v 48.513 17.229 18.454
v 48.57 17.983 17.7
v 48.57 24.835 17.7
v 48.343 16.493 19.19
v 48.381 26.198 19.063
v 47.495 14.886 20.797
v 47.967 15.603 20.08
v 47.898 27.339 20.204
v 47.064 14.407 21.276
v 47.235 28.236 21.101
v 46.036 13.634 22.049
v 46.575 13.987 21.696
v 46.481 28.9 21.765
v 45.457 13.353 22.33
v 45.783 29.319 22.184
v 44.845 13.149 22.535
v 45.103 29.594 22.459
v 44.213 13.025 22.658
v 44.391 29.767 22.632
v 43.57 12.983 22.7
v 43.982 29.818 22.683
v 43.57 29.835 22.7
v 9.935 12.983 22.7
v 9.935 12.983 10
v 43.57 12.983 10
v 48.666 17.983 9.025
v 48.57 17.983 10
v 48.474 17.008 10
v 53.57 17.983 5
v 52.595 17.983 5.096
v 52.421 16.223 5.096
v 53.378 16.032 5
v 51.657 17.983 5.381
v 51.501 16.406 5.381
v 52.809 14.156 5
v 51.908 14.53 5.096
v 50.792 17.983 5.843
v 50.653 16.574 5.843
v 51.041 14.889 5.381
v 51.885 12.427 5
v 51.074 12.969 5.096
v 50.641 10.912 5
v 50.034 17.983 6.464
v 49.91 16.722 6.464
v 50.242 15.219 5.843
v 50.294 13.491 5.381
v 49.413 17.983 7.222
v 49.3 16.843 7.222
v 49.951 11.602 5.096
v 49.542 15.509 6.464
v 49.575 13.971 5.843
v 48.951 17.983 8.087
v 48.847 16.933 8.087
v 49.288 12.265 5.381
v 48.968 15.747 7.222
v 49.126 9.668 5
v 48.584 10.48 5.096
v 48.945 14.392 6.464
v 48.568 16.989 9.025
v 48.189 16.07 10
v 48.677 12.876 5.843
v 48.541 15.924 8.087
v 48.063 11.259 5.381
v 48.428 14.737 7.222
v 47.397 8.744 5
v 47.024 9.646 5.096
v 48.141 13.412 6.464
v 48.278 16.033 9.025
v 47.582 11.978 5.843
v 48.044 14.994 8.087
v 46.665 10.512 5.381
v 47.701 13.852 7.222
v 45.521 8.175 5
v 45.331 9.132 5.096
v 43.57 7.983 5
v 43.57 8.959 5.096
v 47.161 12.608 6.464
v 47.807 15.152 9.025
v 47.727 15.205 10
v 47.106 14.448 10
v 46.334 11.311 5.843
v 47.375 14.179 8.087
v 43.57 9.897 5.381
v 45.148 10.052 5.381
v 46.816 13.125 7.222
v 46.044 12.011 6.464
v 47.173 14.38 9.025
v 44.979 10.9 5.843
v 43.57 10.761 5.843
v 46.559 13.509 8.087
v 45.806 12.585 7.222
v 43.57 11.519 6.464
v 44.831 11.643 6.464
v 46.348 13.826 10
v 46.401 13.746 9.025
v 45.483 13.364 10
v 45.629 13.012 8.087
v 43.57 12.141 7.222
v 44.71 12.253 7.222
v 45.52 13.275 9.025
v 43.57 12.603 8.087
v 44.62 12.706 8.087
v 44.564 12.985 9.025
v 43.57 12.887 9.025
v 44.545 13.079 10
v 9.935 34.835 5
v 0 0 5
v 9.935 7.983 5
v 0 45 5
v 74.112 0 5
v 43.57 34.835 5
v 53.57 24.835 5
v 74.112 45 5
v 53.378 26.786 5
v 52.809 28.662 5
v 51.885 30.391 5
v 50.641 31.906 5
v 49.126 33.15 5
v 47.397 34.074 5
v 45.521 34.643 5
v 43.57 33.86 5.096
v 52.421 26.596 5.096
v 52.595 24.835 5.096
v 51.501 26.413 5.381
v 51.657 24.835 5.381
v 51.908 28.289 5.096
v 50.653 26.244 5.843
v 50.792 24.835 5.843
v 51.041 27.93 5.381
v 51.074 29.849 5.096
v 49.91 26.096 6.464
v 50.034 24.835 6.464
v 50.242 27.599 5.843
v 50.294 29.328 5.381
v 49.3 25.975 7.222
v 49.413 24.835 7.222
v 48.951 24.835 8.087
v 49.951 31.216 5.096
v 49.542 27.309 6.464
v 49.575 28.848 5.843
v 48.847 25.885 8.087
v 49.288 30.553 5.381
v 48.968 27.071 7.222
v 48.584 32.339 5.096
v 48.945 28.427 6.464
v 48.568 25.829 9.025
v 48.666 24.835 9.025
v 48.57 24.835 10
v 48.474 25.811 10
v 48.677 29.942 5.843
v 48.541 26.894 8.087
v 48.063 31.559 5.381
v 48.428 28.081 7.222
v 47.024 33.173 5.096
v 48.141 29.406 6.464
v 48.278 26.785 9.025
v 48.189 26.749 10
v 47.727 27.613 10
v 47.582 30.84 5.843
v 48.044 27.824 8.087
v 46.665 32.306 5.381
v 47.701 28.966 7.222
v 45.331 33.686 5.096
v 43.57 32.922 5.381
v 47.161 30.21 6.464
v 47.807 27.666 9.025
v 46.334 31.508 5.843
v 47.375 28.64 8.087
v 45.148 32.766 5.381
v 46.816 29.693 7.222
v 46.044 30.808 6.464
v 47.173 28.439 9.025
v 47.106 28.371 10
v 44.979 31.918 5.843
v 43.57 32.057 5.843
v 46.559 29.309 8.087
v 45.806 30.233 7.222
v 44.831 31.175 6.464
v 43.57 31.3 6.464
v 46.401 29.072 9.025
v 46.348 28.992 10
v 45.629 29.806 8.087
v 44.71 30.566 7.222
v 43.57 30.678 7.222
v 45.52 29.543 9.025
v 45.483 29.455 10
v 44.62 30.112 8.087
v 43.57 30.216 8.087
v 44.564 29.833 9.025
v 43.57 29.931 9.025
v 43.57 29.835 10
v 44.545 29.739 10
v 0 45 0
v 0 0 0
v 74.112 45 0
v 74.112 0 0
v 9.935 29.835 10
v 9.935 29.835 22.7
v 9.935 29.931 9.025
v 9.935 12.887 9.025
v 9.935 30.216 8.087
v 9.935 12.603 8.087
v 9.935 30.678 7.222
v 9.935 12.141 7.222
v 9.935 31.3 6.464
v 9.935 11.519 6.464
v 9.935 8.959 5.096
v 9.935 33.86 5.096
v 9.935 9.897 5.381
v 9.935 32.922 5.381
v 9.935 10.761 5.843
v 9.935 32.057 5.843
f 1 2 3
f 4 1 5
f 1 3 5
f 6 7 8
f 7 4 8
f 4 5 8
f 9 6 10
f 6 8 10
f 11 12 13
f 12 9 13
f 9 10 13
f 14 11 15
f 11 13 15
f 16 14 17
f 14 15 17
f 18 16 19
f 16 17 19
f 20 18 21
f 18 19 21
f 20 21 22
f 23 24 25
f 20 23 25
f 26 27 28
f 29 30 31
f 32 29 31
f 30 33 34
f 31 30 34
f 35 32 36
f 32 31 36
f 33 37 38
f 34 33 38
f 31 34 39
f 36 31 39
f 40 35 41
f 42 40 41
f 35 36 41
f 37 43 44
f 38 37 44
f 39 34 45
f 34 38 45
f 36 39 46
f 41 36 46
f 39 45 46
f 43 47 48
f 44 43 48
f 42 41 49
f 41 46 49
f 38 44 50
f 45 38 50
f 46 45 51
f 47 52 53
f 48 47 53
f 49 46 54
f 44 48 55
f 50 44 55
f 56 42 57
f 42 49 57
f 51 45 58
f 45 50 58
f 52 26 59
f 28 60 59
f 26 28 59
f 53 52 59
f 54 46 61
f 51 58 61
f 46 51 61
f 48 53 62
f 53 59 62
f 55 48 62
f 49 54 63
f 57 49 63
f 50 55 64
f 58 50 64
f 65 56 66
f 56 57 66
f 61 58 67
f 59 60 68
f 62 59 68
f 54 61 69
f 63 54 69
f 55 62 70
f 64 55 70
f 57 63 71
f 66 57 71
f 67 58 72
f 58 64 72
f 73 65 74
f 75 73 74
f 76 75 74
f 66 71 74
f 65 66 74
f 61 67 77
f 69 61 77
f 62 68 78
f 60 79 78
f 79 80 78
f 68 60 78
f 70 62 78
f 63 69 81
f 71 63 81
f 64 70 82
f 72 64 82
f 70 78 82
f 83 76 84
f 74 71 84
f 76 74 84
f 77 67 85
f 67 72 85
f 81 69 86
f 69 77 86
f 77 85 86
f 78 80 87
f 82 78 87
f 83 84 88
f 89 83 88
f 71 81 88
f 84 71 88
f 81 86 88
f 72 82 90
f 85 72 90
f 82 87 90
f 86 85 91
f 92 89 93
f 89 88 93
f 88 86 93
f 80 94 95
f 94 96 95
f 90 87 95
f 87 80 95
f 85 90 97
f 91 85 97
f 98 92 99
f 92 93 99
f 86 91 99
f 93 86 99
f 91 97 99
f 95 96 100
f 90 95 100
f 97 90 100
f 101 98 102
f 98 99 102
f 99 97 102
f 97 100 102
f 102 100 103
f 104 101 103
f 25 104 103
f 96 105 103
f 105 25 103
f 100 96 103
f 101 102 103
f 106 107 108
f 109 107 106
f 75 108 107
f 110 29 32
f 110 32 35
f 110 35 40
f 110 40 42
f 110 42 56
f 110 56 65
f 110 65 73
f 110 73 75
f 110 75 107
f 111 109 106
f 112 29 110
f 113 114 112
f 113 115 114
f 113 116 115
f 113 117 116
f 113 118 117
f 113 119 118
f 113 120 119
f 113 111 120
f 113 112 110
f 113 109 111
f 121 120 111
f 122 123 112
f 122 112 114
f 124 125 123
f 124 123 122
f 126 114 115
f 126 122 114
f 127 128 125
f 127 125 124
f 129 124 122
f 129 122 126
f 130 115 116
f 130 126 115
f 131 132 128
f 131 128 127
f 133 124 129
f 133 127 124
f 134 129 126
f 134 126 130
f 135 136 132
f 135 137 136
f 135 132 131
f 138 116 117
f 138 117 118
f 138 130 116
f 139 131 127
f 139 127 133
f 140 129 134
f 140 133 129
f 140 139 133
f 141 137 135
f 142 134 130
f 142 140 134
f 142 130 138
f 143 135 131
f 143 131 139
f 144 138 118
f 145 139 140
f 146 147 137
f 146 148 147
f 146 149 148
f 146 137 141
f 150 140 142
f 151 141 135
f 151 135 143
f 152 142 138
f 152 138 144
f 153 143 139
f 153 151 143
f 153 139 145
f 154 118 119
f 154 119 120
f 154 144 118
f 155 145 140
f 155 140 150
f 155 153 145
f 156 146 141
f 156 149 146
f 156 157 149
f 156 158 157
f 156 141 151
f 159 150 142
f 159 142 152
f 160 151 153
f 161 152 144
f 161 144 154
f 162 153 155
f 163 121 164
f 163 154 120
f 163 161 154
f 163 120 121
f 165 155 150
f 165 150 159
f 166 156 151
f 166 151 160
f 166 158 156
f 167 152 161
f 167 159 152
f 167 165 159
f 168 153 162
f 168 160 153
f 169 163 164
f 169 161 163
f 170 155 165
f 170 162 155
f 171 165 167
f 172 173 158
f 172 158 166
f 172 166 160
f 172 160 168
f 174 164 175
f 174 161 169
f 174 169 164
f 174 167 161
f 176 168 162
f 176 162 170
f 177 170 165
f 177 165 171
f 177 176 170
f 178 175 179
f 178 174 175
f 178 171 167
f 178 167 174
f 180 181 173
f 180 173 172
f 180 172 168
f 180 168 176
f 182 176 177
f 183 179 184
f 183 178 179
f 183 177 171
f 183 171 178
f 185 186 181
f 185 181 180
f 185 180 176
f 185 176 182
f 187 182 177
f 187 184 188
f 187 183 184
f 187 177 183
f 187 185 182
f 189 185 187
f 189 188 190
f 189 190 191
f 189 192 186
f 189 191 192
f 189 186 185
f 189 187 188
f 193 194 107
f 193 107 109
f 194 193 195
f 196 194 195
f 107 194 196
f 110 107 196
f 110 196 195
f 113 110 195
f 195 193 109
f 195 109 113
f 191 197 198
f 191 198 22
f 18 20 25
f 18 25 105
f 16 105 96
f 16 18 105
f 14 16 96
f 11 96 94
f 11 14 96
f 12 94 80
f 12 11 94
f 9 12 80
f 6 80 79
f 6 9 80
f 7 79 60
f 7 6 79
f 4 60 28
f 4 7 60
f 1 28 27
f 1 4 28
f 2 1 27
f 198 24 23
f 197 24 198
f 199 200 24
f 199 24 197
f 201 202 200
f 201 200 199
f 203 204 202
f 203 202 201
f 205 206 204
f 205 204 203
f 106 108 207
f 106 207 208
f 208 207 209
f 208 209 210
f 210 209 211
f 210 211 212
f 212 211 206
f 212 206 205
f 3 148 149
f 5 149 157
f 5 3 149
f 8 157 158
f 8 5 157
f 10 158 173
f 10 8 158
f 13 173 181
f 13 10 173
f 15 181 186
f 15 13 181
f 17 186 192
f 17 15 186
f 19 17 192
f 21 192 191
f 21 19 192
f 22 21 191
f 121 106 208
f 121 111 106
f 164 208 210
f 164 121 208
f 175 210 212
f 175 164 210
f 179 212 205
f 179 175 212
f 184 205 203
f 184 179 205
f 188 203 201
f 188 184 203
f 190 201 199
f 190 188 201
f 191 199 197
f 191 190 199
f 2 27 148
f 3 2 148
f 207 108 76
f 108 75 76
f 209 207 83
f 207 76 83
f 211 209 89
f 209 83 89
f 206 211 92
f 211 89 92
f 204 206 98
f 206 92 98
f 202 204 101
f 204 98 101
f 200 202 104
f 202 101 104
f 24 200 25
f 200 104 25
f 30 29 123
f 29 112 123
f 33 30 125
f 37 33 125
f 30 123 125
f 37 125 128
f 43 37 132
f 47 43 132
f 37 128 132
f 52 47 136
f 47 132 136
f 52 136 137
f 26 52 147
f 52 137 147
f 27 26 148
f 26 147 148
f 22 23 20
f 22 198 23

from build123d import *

# Parameters (mm, degrees)
F0_W     = 74.1118490696
F0_H     = 45.0000055134
F1_DEPTH = 5
F3_W     = 38.6348655447
F3_H     = 16.8519383296
F4_DEPTH = 17.7
F5_R     = 5


with BuildPart() as f1:
    # F0 (on Top) → F1 (new body)
    with BuildSketch(Plane.XY):
        with Locations((37.0559245348, 22.5000027567)):
            Rectangle(F0_W, F0_H)
    extrude(amount=F1_DEPTH)

    # F3 (on face) → F4 (join)
    with BuildSketch(Plane.XY.offset(5)):
        with Locations((29.2525482364, 21.4091469534)):
            Rectangle(F3_W, F3_H)
    extrude(amount=F4_DEPTH)

    # F5
    f5_edges = [f1.edges().sort_by_distance(p)[0] for p in [
        (48.569981, 12.983178, 13.85),
        (48.569981, 29.835116, 13.85),
        (48.569981, 21.409147, 5),
        (48.569981, 21.409147, 22.7),
        (29.252548, 12.983178, 5),
        (29.252548, 29.835116, 5),
    ]]
    fillet(f5_edges, radius=F5_R)


solid = f1.part
